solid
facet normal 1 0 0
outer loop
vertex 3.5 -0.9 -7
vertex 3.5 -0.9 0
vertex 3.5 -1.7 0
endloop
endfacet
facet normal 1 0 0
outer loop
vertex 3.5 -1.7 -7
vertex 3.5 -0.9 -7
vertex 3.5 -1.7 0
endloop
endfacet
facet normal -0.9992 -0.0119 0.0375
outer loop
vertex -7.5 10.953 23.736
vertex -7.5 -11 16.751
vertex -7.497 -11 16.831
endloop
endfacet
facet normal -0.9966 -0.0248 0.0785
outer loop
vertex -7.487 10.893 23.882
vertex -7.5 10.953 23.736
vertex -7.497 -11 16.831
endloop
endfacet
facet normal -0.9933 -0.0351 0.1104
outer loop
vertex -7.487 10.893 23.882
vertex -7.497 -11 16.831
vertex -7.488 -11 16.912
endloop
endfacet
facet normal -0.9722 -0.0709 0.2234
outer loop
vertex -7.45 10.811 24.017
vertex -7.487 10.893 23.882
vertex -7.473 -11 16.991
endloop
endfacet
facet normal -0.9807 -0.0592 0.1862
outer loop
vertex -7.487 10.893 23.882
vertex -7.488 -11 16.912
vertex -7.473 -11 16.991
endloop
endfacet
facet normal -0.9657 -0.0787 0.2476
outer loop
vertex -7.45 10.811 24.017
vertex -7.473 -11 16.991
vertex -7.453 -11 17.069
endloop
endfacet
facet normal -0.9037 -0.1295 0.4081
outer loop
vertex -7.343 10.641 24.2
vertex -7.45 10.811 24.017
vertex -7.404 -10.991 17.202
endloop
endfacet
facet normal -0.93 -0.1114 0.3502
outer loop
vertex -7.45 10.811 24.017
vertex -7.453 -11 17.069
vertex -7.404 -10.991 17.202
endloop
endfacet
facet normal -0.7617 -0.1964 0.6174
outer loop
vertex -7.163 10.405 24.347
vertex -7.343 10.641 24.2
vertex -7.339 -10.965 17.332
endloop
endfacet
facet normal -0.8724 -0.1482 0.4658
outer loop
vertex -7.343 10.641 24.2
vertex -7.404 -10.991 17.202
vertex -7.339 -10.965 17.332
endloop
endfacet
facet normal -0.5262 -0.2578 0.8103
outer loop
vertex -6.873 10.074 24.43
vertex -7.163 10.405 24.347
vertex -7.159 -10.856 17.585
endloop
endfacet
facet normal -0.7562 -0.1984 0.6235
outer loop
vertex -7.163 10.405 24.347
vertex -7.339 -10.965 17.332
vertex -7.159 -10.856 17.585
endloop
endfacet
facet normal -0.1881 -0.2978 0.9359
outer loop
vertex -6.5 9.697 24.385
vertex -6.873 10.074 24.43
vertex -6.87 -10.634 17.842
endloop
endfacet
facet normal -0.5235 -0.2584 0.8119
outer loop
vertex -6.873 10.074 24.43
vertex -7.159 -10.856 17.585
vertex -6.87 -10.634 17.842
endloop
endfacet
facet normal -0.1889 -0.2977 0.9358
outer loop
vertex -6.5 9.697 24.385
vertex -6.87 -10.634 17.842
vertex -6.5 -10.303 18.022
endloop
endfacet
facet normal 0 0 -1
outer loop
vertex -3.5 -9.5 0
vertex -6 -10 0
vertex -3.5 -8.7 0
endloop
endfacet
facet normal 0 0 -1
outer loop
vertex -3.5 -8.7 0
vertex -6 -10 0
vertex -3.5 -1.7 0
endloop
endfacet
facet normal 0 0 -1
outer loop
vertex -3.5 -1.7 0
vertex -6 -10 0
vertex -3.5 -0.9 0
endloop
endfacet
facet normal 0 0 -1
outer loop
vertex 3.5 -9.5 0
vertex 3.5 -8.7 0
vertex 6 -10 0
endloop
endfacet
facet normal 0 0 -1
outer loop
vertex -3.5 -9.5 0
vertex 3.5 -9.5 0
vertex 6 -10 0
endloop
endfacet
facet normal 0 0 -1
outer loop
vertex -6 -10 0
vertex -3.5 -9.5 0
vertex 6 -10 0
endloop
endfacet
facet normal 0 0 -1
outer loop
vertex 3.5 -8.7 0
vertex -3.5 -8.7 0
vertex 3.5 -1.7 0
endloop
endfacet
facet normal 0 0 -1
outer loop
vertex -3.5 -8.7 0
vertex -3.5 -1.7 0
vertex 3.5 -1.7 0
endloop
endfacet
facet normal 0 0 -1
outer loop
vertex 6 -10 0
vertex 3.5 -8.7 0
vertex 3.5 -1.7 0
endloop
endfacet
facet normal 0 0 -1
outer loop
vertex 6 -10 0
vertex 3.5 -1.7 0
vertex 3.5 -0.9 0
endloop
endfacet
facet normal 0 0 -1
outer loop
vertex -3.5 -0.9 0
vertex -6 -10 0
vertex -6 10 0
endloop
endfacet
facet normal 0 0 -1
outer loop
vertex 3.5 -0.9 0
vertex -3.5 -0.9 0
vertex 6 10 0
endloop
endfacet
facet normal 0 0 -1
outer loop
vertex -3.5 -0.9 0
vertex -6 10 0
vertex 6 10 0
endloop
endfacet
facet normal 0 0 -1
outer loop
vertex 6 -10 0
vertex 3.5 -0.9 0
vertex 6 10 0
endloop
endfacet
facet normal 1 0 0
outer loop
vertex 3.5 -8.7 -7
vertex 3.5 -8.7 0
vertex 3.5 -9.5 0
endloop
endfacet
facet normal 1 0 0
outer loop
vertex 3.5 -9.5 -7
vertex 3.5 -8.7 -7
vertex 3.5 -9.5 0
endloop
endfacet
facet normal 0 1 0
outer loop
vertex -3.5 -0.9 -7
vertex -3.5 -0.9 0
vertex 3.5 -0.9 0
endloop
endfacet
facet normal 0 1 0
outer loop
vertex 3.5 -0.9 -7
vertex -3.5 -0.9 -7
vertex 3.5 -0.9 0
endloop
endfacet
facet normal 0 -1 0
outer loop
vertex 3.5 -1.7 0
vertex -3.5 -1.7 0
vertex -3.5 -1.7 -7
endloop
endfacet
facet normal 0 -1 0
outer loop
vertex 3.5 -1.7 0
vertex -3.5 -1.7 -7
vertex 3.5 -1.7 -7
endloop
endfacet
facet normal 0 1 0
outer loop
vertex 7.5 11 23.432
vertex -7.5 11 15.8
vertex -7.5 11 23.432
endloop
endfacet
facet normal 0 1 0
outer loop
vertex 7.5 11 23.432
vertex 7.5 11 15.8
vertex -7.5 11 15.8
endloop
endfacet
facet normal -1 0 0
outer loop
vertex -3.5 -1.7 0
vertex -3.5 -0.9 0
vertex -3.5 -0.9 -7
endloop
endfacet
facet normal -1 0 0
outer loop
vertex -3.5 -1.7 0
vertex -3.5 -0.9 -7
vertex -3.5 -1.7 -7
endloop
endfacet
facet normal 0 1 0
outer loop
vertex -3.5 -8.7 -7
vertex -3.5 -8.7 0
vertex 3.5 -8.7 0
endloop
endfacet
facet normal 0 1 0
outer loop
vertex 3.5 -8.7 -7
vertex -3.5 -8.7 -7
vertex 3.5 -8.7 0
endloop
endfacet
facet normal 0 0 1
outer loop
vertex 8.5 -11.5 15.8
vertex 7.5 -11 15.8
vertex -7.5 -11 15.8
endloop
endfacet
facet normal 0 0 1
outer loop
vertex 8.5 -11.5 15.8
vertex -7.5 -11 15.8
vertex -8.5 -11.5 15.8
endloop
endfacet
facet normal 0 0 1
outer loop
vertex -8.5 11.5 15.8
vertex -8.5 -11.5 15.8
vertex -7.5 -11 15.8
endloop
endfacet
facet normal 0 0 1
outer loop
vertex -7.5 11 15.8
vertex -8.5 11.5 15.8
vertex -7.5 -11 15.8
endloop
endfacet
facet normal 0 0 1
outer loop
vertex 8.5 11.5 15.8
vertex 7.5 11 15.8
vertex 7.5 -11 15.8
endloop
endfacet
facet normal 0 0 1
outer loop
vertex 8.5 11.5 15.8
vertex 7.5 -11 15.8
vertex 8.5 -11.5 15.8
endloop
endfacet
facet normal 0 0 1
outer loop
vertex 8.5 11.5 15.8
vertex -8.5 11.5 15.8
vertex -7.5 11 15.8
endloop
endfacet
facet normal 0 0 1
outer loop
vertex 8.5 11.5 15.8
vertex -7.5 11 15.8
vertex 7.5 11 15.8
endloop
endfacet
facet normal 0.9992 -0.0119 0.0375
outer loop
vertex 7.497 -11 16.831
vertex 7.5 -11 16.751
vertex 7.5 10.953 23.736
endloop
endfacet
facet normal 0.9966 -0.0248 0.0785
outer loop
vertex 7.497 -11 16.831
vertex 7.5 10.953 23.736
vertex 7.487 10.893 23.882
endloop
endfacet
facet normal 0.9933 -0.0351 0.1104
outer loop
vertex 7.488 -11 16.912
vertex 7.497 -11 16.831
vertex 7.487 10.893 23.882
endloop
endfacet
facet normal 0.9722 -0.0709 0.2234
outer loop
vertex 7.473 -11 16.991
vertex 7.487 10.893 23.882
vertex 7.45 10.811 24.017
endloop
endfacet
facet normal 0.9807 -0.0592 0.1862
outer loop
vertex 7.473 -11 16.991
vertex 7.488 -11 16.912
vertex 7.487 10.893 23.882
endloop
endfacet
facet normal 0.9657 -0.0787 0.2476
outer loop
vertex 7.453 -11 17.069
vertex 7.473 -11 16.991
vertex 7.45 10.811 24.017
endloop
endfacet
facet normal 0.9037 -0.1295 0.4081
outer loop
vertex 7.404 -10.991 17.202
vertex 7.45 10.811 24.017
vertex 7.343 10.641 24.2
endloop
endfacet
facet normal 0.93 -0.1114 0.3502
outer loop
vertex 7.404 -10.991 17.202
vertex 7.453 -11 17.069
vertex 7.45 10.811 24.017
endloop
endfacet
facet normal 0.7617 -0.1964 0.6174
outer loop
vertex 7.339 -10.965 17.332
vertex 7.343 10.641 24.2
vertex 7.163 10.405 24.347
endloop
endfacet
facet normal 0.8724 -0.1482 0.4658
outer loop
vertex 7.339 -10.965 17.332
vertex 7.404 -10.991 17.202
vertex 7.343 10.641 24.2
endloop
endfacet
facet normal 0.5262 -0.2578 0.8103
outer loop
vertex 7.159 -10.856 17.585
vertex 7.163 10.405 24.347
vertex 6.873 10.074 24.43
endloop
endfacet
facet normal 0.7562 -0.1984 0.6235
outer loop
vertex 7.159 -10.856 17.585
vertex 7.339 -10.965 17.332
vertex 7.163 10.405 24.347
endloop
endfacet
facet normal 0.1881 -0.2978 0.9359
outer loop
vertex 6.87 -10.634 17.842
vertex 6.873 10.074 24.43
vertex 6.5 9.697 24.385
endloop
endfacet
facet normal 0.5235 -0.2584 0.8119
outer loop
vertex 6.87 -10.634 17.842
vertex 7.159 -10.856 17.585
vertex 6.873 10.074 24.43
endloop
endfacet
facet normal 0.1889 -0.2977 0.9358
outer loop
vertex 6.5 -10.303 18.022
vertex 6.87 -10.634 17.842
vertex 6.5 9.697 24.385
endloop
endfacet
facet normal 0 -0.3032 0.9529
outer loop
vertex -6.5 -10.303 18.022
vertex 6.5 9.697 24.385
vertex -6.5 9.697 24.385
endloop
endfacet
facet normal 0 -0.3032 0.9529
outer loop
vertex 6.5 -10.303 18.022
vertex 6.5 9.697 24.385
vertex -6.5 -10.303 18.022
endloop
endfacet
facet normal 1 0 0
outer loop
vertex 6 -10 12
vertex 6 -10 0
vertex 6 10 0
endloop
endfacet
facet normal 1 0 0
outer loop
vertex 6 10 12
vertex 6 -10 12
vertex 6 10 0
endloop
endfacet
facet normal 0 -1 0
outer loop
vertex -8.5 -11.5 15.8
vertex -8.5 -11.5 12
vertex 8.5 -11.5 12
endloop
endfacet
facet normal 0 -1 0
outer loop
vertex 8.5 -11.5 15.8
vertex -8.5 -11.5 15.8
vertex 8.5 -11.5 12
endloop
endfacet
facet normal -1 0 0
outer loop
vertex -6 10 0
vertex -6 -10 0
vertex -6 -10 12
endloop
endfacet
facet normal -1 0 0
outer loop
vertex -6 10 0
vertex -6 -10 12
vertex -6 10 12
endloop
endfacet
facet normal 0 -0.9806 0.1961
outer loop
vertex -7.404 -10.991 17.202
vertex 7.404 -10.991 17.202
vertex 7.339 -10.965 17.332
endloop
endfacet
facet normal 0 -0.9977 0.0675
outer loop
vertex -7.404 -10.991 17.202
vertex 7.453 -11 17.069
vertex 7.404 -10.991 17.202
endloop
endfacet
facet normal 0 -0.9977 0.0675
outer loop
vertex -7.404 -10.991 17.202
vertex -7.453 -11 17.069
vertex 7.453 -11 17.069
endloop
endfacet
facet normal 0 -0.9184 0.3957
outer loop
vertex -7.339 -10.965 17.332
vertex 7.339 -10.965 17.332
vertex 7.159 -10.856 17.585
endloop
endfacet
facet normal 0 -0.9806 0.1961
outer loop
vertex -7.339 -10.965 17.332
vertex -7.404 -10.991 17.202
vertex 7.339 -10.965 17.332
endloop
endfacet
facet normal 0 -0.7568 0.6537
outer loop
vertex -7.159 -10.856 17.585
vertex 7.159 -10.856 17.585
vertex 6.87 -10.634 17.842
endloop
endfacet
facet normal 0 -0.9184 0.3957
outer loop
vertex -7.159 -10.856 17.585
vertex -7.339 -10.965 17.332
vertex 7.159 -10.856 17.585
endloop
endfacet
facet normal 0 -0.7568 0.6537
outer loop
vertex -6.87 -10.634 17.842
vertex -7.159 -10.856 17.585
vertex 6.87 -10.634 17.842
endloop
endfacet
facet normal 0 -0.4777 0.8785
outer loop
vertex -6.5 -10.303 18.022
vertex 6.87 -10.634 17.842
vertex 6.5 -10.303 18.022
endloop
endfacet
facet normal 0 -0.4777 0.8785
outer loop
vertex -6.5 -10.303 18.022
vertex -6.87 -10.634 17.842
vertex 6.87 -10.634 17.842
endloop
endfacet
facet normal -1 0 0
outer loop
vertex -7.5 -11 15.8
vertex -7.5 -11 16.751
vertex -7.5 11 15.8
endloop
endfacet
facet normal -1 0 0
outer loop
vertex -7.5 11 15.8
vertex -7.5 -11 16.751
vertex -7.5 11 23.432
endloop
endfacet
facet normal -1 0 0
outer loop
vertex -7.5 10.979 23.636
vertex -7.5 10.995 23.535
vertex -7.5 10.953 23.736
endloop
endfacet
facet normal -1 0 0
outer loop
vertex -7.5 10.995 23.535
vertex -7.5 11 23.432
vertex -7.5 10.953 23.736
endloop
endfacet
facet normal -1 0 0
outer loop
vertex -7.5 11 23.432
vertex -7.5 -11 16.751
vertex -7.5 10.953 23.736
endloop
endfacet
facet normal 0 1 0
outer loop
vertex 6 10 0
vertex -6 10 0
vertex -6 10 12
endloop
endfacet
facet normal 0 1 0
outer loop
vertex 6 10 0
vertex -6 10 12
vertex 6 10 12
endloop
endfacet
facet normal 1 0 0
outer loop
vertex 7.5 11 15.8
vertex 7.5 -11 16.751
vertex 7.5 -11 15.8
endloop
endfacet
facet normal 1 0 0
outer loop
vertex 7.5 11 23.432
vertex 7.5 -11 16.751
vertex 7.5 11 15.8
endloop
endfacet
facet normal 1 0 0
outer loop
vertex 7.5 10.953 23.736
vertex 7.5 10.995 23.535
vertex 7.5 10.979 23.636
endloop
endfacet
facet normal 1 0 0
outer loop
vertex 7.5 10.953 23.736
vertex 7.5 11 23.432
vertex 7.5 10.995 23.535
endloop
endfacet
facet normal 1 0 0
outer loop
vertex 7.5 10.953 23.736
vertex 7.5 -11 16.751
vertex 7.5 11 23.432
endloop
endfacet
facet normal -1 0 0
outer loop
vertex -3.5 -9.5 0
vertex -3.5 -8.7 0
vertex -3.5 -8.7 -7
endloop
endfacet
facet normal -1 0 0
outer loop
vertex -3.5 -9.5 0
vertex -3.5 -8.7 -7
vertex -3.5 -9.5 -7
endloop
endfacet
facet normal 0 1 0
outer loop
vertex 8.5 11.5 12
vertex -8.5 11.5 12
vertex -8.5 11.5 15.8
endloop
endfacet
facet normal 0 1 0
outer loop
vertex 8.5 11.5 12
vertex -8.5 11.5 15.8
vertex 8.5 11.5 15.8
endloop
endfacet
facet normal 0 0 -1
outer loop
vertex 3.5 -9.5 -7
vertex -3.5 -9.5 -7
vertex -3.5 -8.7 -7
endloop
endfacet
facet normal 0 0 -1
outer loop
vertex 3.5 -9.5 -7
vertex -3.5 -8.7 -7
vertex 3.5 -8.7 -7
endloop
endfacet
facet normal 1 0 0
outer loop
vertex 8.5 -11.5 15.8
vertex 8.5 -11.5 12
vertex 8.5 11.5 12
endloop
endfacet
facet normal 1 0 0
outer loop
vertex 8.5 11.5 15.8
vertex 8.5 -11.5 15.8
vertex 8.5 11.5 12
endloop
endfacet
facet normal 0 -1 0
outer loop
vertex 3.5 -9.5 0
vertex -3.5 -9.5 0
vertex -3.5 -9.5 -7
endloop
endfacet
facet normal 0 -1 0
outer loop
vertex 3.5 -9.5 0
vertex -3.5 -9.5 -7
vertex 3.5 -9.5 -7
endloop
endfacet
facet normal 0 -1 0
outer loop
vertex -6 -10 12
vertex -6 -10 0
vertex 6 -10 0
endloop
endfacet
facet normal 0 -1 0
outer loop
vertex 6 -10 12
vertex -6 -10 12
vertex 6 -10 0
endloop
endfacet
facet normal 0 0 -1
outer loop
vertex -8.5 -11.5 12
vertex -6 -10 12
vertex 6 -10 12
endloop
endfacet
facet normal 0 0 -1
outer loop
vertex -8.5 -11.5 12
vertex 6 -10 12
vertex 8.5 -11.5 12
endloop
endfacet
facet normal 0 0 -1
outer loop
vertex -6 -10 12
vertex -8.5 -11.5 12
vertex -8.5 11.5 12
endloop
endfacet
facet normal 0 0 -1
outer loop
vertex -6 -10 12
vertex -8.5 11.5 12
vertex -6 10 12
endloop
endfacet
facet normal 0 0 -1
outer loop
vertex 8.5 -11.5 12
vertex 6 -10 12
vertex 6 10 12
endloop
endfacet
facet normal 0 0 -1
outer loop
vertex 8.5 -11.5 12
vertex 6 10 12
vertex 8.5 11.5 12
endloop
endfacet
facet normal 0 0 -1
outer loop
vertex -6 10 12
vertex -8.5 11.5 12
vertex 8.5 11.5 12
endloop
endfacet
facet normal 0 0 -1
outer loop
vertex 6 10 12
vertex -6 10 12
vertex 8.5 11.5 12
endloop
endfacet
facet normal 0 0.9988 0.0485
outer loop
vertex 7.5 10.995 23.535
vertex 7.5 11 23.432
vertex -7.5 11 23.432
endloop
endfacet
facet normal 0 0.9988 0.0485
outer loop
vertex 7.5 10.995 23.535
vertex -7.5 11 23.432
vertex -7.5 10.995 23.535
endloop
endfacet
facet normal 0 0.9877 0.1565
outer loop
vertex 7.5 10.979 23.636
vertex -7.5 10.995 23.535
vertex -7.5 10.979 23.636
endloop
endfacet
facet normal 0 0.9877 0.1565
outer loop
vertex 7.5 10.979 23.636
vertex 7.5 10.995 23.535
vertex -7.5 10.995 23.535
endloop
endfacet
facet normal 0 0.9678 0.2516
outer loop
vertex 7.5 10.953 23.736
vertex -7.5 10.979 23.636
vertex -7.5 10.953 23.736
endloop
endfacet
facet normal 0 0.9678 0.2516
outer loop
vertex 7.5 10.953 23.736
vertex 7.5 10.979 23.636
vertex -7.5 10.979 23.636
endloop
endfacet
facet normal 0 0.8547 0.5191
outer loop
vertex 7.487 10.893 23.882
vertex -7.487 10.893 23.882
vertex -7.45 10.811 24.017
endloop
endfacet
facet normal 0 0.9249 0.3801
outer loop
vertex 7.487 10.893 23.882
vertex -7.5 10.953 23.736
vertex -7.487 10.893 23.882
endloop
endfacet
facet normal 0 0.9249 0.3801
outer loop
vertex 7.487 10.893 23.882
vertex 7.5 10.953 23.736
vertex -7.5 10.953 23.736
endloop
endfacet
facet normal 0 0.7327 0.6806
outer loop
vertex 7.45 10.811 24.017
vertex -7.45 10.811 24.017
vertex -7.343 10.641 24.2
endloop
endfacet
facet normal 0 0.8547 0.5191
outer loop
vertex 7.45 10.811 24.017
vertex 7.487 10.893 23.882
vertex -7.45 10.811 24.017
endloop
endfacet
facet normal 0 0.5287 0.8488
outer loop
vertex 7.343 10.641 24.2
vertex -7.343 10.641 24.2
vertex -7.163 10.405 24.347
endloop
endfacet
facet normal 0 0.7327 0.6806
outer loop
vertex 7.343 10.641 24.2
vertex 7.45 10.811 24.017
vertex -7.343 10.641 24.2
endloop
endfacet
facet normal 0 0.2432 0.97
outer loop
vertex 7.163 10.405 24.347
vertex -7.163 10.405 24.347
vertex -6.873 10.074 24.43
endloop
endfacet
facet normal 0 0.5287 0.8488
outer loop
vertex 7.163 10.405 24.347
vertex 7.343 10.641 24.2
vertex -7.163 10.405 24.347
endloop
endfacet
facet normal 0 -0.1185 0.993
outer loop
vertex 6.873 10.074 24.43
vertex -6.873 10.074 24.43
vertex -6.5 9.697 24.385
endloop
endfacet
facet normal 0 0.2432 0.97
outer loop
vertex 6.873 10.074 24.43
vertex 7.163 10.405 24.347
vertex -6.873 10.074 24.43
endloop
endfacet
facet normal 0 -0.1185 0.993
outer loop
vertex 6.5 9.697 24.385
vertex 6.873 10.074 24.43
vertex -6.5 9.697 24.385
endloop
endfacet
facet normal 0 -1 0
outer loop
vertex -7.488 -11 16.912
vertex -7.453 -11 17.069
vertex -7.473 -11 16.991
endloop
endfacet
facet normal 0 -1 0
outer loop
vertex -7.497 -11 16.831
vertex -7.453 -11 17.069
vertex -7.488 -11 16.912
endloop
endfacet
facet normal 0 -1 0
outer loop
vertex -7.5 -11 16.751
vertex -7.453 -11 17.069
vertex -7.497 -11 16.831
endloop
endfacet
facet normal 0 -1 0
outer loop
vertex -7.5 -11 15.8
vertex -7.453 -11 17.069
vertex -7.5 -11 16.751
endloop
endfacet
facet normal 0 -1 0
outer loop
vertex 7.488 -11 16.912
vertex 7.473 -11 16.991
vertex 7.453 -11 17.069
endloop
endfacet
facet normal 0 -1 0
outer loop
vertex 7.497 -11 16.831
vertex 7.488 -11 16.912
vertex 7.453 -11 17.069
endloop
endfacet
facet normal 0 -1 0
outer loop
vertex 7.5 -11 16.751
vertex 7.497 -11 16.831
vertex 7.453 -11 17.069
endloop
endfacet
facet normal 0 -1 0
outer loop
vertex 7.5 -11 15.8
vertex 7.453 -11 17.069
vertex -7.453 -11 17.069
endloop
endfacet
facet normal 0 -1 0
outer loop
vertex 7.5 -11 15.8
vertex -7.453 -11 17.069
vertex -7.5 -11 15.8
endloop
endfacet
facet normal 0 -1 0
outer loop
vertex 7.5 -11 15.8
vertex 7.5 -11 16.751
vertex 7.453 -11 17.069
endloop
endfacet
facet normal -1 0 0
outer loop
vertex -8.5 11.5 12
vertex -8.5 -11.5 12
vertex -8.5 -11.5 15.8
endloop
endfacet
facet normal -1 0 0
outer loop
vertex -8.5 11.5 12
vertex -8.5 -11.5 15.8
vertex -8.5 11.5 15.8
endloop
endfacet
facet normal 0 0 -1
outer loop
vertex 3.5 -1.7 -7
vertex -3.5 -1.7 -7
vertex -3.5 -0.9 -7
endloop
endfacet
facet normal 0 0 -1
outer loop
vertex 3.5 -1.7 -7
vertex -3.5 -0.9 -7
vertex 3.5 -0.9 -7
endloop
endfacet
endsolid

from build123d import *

# Parameters (mm, degrees)
F0_W     = 12
F0_H     = 20
F1_DEPTH = 12
F2_W     = 17
F2_H     = 23
F2_W_2   = 12
F2_H_2   = 20
F3_DEPTH = 3.8
F4_W     = 7
F4_H     = 0.8
F5_DEPTH = 7
F7_DEPTH = 7.5
F8_R     = 1


with BuildPart() as f1:
    # F0 (on Top) → F1 (new body)
    with BuildSketch(Plane.XY):
        Rectangle(F0_W, F0_H)
    extrude(amount=F1_DEPTH)

    # F2 (on face) → F3 (join)
    with BuildSketch(Plane.XY.offset(12)):
        Rectangle(F2_W, F2_H)
        Rectangle(F2_W_2, F2_H_2, mode=Mode.SUBTRACT)
        Rectangle(F2_W_2, F2_H_2)
    extrude(amount=F3_DEPTH)

    # F4 (on face) → F5 (join)
    with BuildSketch(Plane(origin=(0, 0, 0), x_dir=(1, 0, 0), z_dir=(0, 0, -1))):
        with Locations((0, 9.1)):
            Rectangle(F4_W, F4_H)
        with Locations((0, 1.3)):
            Rectangle(F4_W, F4_H)
    extrude(amount=F5_DEPTH)

    # F6 (on Right) → F7 (join, symmetric)
    with BuildSketch(Plane.YZ):
        Polygon((-11, 15.8), (11, 15.8), (11, 24.8), (-11, 17.8), align=None)
    extrude(amount=F7_DEPTH, both=True)

    # F8
    f8_edges = [f1.edges().sort_by_distance(p)[0] for p in [
        (0, 11, 24.8),
        (-7.5, 0, 21.3),
        (0, -11, 17.8),
        (7.5, 0, 21.3),
    ]]
    fillet(f8_edges, radius=F8_R)


solid = f1.part
